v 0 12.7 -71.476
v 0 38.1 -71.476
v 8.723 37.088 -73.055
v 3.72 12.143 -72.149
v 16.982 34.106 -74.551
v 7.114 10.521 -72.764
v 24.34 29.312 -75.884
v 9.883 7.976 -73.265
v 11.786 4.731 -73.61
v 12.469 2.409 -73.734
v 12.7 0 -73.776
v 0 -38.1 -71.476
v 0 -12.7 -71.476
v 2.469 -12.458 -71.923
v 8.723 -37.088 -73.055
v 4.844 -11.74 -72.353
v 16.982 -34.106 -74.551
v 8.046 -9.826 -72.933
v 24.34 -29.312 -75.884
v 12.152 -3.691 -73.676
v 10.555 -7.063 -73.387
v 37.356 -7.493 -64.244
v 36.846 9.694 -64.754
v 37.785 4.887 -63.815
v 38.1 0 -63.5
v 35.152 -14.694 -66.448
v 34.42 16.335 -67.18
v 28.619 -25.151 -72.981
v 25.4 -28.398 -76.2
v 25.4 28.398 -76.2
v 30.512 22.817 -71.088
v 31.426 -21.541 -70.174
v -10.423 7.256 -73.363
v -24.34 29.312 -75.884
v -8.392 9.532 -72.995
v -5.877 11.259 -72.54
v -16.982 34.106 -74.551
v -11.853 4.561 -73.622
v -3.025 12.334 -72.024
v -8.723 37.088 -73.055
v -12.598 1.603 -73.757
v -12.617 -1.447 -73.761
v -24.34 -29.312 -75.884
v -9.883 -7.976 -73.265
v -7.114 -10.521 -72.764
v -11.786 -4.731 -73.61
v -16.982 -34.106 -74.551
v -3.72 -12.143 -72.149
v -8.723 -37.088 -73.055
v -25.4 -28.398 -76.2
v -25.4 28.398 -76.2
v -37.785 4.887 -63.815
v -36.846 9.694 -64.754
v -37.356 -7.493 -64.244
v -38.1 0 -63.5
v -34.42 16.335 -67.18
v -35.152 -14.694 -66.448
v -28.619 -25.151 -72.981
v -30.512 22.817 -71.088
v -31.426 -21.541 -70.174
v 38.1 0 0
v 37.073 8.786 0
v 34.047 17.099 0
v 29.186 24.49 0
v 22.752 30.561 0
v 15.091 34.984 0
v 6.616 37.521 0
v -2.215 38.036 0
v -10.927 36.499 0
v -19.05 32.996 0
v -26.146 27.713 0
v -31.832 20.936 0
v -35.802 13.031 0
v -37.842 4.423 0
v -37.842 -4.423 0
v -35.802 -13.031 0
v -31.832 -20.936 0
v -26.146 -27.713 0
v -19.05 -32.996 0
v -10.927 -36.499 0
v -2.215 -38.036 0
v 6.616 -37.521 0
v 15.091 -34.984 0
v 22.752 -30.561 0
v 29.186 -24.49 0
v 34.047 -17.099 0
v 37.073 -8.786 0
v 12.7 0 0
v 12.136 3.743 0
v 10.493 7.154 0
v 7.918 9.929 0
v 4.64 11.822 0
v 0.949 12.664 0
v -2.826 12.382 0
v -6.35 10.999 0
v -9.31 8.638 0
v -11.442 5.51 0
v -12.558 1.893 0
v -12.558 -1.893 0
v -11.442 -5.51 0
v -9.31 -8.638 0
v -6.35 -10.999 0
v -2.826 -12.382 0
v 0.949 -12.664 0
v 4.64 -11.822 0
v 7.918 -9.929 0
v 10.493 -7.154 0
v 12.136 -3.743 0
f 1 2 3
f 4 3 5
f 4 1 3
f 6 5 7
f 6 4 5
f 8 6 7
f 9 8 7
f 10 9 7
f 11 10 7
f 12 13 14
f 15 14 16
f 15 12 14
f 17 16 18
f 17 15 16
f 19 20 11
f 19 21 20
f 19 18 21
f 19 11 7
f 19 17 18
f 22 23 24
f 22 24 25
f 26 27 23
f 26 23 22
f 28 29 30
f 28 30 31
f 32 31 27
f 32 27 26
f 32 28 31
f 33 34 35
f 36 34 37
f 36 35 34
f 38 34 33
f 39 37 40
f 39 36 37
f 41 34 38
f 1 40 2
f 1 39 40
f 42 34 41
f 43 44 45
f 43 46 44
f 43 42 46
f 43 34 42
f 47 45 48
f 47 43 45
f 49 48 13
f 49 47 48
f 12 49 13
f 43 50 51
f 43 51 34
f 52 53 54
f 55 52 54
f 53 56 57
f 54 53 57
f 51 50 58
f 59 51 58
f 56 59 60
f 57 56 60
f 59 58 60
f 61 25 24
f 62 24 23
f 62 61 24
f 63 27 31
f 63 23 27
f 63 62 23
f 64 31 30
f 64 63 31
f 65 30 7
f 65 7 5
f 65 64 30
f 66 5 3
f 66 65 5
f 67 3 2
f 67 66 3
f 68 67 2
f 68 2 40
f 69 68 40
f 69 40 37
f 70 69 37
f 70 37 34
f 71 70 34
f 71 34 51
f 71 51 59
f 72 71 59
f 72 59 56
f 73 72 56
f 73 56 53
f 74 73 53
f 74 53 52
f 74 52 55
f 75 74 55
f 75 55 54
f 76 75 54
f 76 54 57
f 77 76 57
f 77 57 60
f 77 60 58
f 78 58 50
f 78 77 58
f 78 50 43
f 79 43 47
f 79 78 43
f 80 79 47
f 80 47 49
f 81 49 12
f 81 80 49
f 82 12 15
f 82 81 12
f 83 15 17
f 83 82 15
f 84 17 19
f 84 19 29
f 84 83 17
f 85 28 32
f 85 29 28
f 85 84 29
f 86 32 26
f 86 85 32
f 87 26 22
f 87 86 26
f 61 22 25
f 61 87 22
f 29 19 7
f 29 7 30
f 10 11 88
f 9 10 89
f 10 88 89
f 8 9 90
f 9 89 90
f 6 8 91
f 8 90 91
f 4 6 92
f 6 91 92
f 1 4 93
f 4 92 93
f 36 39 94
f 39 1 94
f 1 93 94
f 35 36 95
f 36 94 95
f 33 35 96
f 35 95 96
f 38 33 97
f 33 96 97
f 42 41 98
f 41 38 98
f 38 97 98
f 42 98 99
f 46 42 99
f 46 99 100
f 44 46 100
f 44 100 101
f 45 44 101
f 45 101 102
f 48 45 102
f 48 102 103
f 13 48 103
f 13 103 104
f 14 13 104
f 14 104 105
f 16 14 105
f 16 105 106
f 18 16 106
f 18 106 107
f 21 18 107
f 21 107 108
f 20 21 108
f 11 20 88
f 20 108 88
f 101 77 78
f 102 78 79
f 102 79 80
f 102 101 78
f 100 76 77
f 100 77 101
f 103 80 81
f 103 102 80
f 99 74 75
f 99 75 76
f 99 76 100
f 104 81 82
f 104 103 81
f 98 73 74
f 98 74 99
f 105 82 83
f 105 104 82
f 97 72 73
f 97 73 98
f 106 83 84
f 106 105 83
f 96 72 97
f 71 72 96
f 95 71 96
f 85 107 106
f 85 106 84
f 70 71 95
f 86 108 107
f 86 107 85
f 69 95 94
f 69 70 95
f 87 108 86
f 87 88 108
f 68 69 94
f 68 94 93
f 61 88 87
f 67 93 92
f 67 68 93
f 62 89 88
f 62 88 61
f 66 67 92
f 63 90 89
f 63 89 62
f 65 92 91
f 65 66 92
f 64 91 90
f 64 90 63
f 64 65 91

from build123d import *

# Parameters (mm, degrees)
SKETCH1_R               = 38.1
SKETCH1_R_2             = 12.7
BOSS_EXTRUDE1_DEPTH     = 76.2
CUT_EXTRUDE1_DEPTH      = 94.3255592
CUT_EXTRUDE1_DEPTH_BACK = 94.3255592


with BuildPart() as part:
    # Sketch1 → Boss-Extrude1 (new body)
    with BuildSketch(Plane.XY):
        Circle(SKETCH1_R)
        Circle(SKETCH1_R_2, mode=Mode.SUBTRACT)
    extrude(amount=-BOSS_EXTRUDE1_DEPTH)

    # Sketch2 → Cut-Extrude1 (cut, two sides: drawn at the far end of the back side and taken through both)
    with BuildSketch(Plane(origin=(0, 0, 0), x_dir=(1, 0, 0), z_dir=(0, 1, 0)).offset(-CUT_EXTRUDE1_DEPTH_BACK)):
        Polygon((-38.1, 76.2), (-25.4, 76.2), (-38.1, 63.5), align=None)
        with BuildLine():
            Line((0, 76.2), (-25.4, 76.2))
            ThreePointArc((-25.4, 76.2), (-24.878689197, 76.012385142), (-24.339821442, 75.883599159))
            Line((-24.339821442, 75.883599159), (0, 71.4756))
            Line((0, 71.4756), (0, 76.2))
        make_face()
        with BuildLine():
            Line((25.4, 76.2), (0, 76.2))
            Line((0, 76.2), (0, 71.4756))
            Line((0, 71.4756), (24.339821442, 75.883599159))
            ThreePointArc((24.339821442, 75.883599159), (24.878689197, 76.012385142), (25.4, 76.2))
        make_face()
        Polygon((38.1, 76.2), (25.4, 76.2), (38.1, 63.5), align=None)
    extrude(amount=CUT_EXTRUDE1_DEPTH + CUT_EXTRUDE1_DEPTH_BACK, mode=Mode.SUBTRACT)


solid = part.part
